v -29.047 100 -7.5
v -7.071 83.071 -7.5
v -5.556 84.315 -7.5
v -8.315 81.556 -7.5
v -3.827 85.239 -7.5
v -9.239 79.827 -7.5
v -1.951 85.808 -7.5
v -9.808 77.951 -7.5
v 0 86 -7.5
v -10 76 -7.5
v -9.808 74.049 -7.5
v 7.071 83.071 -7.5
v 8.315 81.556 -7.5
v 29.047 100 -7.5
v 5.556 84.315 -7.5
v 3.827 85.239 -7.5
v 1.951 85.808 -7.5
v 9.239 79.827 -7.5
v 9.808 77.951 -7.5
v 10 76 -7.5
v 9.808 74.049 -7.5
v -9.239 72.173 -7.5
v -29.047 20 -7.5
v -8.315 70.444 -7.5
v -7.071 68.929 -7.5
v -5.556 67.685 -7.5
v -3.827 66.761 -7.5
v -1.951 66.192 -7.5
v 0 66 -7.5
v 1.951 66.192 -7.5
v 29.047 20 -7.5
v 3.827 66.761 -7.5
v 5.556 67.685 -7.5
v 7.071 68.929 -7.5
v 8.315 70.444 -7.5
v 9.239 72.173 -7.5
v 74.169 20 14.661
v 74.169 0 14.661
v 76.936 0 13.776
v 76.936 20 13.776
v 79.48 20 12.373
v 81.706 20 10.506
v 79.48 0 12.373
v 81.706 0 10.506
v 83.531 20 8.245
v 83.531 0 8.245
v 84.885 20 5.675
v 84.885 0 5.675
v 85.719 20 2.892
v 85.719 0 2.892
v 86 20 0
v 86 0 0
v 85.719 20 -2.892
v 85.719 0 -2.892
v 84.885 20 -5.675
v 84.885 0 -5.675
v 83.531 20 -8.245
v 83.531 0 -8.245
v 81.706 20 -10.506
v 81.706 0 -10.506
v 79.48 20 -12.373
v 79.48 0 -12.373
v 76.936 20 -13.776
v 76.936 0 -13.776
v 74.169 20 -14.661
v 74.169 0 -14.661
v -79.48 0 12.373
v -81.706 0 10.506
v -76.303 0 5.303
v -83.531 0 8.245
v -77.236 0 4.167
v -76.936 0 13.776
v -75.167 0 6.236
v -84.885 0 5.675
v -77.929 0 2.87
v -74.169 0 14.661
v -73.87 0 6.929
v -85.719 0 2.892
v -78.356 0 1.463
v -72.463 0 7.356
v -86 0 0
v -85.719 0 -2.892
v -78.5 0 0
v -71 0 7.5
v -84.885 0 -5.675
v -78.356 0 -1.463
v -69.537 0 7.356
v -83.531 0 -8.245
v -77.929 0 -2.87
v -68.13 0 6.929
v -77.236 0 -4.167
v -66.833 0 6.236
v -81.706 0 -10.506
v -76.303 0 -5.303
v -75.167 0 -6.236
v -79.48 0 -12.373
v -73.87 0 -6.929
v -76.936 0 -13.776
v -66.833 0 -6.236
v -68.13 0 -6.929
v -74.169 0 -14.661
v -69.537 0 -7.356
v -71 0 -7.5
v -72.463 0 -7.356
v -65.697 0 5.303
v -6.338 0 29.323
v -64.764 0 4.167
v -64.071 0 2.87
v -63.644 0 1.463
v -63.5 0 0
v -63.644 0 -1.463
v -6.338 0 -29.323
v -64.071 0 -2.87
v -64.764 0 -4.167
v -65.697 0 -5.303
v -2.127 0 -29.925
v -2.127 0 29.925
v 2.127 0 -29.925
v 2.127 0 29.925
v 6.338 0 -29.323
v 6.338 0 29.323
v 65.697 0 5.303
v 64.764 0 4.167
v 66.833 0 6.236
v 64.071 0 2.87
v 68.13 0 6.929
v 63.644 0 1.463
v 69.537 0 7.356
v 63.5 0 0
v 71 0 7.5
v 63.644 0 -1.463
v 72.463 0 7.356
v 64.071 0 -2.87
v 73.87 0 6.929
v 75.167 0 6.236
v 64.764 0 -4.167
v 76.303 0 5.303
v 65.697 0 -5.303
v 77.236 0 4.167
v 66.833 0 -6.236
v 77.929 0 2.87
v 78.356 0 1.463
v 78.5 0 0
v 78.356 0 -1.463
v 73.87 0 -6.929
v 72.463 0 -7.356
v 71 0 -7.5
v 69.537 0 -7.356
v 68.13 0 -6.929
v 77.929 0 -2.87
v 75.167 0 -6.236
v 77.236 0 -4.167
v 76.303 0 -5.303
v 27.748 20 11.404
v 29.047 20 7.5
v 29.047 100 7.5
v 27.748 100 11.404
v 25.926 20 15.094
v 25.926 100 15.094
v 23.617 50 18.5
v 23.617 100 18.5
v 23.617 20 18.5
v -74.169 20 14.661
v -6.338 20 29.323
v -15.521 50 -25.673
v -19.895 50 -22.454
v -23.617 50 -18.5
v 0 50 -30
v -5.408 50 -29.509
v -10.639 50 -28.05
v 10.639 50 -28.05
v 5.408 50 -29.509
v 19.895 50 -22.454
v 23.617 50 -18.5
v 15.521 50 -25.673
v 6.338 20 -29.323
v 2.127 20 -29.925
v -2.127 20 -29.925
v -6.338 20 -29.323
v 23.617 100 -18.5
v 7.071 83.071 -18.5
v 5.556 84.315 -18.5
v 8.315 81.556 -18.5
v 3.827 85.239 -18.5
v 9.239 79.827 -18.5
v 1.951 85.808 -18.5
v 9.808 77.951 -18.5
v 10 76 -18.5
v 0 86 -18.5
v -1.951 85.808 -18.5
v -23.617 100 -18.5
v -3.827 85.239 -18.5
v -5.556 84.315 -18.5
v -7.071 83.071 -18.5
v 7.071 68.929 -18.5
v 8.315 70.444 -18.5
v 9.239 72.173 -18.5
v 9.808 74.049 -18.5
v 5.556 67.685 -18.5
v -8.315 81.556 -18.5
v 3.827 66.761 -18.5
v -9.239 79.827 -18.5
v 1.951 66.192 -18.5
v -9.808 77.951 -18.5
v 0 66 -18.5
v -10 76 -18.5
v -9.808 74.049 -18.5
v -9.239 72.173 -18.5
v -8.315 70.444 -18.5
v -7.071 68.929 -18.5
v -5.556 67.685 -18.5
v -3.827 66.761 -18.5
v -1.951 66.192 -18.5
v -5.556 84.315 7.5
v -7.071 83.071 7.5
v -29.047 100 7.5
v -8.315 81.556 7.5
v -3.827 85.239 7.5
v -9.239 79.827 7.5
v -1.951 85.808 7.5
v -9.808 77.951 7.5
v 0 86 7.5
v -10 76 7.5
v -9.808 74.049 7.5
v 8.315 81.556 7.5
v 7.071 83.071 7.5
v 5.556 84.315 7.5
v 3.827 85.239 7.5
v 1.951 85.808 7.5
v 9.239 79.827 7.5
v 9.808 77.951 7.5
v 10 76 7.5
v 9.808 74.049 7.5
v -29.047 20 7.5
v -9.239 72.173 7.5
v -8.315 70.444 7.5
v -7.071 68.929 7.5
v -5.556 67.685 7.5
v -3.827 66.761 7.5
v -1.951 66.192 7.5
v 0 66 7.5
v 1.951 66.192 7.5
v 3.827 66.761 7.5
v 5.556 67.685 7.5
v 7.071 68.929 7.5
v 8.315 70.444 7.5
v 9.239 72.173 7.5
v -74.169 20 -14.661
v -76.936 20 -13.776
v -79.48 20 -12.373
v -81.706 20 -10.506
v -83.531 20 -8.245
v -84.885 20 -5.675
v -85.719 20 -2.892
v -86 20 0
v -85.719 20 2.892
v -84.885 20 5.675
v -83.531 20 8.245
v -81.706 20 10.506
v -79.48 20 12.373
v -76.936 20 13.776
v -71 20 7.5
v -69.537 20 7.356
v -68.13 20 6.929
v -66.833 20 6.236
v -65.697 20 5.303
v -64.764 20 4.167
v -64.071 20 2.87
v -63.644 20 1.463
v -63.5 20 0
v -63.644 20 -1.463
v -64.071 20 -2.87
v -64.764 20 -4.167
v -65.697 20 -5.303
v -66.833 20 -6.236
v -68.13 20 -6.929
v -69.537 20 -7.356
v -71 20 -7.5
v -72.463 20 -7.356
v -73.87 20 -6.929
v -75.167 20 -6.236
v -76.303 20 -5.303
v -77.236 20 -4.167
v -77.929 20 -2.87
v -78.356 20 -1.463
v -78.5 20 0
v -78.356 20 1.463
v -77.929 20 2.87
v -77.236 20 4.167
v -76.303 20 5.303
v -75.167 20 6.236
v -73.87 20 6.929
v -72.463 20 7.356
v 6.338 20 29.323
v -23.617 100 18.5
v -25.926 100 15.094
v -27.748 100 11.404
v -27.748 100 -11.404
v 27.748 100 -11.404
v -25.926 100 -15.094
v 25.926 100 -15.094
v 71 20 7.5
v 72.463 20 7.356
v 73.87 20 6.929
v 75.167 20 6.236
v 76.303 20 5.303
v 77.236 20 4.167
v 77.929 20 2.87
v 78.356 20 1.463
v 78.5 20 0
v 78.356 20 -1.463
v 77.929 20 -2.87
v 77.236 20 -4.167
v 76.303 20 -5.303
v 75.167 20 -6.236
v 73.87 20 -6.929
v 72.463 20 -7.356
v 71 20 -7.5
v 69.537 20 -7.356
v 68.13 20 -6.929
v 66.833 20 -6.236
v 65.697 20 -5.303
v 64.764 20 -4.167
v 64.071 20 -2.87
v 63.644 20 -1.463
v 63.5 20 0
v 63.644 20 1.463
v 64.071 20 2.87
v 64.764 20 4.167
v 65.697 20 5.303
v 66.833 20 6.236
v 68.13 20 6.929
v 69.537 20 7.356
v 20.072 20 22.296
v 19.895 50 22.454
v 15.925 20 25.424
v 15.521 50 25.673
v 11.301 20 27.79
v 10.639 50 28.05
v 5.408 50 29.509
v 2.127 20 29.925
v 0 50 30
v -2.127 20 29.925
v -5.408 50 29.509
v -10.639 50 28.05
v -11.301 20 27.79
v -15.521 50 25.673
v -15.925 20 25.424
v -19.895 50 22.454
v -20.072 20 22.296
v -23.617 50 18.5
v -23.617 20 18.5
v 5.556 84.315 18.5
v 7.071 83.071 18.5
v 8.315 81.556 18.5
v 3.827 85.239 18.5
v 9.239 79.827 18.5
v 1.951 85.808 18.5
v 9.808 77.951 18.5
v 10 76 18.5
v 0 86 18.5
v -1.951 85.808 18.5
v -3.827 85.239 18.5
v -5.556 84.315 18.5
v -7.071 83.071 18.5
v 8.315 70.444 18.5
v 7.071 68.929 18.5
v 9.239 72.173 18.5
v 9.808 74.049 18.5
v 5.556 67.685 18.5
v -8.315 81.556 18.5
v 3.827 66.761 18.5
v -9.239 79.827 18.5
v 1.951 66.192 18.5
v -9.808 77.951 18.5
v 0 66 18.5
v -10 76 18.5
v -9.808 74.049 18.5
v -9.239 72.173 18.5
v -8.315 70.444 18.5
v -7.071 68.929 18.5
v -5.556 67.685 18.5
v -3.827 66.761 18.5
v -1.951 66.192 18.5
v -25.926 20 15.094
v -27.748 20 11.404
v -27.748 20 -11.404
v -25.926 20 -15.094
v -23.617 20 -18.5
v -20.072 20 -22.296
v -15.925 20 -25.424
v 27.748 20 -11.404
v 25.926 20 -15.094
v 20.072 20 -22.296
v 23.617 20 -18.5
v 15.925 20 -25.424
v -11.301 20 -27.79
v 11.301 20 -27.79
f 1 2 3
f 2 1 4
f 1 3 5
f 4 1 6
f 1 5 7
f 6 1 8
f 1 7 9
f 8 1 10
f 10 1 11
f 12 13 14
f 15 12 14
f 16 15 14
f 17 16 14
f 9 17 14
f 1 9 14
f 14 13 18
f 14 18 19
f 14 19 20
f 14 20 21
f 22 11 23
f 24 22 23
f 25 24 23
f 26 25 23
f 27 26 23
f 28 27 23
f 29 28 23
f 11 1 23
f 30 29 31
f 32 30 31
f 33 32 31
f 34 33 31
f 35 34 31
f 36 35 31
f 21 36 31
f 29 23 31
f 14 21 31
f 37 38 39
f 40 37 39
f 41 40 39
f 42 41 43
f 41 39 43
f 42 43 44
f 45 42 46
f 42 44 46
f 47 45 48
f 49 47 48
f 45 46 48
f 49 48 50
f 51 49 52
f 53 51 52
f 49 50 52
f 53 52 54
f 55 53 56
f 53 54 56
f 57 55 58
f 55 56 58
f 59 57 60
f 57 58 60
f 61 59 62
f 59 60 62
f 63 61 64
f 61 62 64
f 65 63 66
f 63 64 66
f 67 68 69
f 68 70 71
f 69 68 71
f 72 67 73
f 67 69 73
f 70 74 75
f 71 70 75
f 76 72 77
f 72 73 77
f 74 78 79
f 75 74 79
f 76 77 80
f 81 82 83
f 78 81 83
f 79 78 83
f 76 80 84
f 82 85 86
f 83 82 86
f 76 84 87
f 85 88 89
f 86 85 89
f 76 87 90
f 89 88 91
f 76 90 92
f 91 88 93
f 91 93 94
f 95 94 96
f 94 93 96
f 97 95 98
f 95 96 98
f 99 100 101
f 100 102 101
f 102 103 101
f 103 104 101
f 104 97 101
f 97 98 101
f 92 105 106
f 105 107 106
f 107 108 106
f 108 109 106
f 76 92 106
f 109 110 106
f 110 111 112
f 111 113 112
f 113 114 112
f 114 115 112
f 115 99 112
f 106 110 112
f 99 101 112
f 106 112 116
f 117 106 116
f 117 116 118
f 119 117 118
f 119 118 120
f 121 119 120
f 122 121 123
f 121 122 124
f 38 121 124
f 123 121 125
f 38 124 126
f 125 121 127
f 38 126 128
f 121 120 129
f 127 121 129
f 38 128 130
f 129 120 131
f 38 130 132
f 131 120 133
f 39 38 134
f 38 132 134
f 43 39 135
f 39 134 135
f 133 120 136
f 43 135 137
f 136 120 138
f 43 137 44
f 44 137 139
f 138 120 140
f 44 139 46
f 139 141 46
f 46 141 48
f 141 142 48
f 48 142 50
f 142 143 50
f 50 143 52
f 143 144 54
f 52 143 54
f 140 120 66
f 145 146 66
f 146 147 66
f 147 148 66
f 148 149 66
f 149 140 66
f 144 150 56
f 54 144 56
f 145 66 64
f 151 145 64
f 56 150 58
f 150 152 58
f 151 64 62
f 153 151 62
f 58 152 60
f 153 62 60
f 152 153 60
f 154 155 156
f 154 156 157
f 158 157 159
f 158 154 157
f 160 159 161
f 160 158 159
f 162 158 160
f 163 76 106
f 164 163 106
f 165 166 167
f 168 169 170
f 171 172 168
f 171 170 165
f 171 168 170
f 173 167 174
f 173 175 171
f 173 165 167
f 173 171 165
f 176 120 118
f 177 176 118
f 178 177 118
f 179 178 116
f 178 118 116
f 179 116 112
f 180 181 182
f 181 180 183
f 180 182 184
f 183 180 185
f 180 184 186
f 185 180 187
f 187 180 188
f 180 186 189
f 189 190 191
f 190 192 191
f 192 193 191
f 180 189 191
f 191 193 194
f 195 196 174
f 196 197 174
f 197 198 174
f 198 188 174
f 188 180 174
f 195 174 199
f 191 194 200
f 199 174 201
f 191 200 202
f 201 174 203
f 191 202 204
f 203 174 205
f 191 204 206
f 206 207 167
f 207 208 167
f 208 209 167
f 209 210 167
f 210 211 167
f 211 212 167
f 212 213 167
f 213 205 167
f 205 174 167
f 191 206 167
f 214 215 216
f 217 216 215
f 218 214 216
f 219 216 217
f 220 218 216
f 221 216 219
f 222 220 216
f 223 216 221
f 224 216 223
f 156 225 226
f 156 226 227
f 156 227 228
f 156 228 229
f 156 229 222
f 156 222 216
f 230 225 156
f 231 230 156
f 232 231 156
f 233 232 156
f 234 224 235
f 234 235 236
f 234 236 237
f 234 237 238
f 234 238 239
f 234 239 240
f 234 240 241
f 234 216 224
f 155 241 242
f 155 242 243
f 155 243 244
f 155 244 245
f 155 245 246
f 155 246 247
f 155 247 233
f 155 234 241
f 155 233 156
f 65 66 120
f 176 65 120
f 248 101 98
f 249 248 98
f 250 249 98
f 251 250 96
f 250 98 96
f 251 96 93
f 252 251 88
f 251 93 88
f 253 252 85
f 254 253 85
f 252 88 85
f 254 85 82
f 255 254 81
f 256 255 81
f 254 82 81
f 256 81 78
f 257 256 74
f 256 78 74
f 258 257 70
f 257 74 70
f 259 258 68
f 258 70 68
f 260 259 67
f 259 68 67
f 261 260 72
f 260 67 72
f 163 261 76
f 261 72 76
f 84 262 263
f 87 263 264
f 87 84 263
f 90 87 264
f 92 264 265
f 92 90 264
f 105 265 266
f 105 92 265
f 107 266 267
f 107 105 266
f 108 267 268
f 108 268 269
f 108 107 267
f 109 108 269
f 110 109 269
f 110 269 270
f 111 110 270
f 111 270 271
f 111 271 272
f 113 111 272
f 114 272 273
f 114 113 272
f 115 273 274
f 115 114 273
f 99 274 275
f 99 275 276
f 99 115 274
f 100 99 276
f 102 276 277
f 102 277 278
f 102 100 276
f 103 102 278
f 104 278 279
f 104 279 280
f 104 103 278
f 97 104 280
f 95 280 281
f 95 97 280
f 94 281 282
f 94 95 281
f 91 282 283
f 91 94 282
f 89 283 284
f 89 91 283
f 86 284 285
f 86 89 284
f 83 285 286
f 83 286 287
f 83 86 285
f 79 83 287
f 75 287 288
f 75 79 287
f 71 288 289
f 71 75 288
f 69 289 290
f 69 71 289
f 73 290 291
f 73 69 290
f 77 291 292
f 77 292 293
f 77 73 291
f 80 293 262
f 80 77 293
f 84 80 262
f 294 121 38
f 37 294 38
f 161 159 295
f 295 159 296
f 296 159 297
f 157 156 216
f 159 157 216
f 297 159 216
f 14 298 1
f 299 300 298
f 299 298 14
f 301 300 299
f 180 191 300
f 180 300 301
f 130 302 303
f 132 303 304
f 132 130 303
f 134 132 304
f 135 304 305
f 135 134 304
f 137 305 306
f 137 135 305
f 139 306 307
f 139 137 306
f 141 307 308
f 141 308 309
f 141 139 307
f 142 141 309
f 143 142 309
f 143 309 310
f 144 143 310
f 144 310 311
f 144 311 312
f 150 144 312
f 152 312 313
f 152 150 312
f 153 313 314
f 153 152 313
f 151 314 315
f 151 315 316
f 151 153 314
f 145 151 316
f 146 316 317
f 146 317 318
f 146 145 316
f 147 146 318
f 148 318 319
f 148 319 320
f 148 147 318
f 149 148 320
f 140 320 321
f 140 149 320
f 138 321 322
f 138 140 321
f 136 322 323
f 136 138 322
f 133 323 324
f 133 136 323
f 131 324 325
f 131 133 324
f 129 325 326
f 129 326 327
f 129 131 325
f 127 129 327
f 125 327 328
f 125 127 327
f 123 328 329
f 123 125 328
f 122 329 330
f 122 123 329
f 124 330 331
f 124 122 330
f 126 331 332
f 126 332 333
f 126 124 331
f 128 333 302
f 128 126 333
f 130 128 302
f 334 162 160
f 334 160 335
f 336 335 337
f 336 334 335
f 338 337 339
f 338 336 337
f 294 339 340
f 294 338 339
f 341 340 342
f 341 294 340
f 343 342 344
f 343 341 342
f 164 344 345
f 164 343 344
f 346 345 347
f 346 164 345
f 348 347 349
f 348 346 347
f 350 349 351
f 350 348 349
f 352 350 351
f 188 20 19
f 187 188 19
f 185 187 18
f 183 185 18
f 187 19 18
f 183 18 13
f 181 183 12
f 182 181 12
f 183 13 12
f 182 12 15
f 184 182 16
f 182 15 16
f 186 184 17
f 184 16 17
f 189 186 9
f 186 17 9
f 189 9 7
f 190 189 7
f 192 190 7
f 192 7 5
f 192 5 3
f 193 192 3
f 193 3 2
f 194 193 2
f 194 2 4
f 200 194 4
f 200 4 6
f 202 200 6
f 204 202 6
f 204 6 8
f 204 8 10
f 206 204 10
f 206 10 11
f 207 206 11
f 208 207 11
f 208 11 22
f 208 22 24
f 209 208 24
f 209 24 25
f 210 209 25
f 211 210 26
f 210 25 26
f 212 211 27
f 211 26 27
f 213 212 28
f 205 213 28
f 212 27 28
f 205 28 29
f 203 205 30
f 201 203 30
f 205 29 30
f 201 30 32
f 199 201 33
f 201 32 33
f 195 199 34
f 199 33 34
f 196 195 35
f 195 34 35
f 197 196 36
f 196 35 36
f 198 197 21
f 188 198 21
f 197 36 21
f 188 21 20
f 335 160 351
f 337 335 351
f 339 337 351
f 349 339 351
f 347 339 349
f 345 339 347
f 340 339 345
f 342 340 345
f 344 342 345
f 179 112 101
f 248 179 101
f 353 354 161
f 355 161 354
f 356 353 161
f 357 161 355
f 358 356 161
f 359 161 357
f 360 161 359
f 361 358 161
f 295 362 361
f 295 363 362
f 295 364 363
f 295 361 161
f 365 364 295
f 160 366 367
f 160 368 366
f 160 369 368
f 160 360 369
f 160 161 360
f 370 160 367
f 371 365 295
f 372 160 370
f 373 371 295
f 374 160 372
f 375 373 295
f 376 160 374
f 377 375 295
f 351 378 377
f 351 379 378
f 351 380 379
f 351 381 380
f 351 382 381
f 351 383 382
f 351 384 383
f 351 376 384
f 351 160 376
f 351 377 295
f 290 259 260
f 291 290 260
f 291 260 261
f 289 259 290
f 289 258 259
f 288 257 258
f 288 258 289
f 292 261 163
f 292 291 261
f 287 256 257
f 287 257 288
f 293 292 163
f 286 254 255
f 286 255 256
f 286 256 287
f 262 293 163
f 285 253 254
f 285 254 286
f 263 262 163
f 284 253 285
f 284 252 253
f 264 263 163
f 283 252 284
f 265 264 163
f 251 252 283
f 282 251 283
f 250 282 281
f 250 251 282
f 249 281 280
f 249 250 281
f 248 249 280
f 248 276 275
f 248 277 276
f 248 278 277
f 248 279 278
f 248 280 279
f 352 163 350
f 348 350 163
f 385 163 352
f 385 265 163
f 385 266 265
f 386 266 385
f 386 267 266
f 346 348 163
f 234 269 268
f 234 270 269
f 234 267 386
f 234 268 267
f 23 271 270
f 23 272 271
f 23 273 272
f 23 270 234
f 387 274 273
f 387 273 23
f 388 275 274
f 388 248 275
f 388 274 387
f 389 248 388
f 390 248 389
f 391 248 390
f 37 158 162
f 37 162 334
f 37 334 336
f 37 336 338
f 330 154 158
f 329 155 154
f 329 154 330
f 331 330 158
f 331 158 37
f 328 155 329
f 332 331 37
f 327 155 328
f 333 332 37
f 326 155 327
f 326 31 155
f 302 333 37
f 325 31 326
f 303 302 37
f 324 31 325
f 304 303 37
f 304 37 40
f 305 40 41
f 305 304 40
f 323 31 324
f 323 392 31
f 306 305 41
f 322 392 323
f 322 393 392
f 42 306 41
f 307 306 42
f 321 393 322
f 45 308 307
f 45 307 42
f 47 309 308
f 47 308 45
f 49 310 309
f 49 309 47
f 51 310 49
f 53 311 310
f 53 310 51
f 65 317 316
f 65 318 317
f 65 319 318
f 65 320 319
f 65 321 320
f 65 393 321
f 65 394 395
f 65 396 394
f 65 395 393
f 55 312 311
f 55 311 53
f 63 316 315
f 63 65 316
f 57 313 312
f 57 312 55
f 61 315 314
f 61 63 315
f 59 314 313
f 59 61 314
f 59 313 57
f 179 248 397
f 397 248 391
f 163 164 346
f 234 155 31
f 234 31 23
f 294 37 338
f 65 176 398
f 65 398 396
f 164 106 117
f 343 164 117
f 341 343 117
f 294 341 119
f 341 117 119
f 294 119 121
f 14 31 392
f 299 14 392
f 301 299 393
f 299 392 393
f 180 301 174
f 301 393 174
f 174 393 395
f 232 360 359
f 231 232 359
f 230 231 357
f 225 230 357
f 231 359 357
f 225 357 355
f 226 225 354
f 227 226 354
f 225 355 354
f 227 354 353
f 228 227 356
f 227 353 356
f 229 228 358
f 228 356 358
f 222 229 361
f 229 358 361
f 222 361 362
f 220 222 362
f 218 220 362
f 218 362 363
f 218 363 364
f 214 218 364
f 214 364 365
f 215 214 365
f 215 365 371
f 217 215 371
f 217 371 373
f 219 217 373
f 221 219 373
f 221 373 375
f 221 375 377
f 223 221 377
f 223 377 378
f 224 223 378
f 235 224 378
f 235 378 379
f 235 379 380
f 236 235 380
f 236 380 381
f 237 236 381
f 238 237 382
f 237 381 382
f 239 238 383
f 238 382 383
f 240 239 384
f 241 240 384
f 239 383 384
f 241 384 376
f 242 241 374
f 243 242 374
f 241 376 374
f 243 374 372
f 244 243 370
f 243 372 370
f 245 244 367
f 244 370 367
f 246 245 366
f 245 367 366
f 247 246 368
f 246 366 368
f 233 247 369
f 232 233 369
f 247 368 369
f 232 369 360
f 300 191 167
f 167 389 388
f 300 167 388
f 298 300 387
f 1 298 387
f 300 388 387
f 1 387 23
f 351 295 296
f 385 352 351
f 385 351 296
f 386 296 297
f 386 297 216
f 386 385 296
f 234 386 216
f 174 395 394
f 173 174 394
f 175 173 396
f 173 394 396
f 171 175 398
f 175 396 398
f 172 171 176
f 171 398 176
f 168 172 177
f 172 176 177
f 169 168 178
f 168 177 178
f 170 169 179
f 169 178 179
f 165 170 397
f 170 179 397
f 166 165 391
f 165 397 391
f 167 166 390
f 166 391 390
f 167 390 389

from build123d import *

# Parameters (mm, degrees)
CROQUIS1_R              = 7.5
SALIENTE_EXTRUIR2_DEPTH = 20
SALIENTE_EXTRUIR3_DEPTH = 30
SALIENTE_EXTRUIR4_DEPTH = 80
CROQUIS4_R              = 10
CORTAR_EXTRUIR1_DEPTH   = 141.528466867


with BuildPart() as part:
    # Croquis1 → Saliente-Extruir2 (new body)
    # profile 1 of 7: a face of its own
    with BuildSketch(Plane(origin=(0, 0, 0), x_dir=(1, 0, 0), z_dir=(0, 1, 0))):
        with BuildLine():
            Line((74.169014085, 14.661423864), (6.338028169, 29.322847729))
            ThreePointArc((6.338028169, 29.322847729), (15.924993338, 25.424291282), (23.616731357, 18.5))
            ThreePointArc((23.616731357, 18.5), (26.900316488, 13.280548665), (29.047375097, 7.5))
            ThreePointArc((29.047375097, 7.5), (29.760890888, 3.780128774), (30, 0))
            ThreePointArc((30, 0), (29.760890888, -3.780128774), (29.047375097, -7.5))
            ThreePointArc((29.047375097, -7.5), (26.900316488, -13.280548665), (23.616731357, -18.5))
            ThreePointArc((23.616731357, -18.5), (15.924993338, -25.424291282), (6.338028169, -29.322847729))
            Line((6.338028169, -29.322847729), (74.169014085, -14.661423864))
            ThreePointArc((74.169014085, -14.661423864), (86, 0), (74.169014085, 14.661423864))
        make_face()
        with Locations(Location((71, 0, 0), (0, 0, 270))):
            Circle(CROQUIS1_R, mode=Mode.SUBTRACT)
    # profile 2 of 7: a face of its own
    with BuildSketch(Plane(origin=(0, 0, 0), x_dir=(1, 0, 0), z_dir=(0, 1, 0))):
        with BuildLine():
            ThreePointArc((-29.047375097, -7.5), (-26.900316488, -13.280548665), (-23.616731357, -18.5))
            Line((-23.616731357, -18.5), (23.616731357, -18.5))
            ThreePointArc((23.616731357, -18.5), (26.900316488, -13.280548665), (29.047375097, -7.5))
            Line((29.047375097, -7.5), (-29.047375097, -7.5))
        make_face()
    # profile 3 of 7: a face of its own
    with BuildSketch(Plane(origin=(0, 0, 0), x_dir=(1, 0, 0), z_dir=(0, 1, 0))):
        with BuildLine():
            ThreePointArc((-23.616731357, -18.5), (-15.924993338, -25.424291282), (-6.338028169, -29.322847729))
            ThreePointArc((-6.338028169, -29.322847729), (0, -30), (6.338028169, -29.322847729))
            ThreePointArc((6.338028169, -29.322847729), (15.924993338, -25.424291282), (23.616731357, -18.5))
            Line((23.616731357, -18.5), (-23.616731357, -18.5))
        make_face()
    # profile 4 of 7: a face of its own
    with BuildSketch(Plane(origin=(0, 0, 0), x_dir=(1, 0, 0), z_dir=(0, 1, 0))):
        with BuildLine():
            Line((29.047375097, 7.5), (-29.047375097, 7.5))
            ThreePointArc((-29.047375097, 7.5), (-30, 0), (-29.047375097, -7.5))
            Line((-29.047375097, -7.5), (29.047375097, -7.5))
            ThreePointArc((29.047375097, -7.5), (29.760890888, -3.780128774), (30, 0))
            ThreePointArc((30, 0), (29.760890888, 3.780128774), (29.047375097, 7.5))
        make_face()
    # profile 5 of 7: a face of its own
    with BuildSketch(Plane(origin=(0, 0, 0), x_dir=(1, 0, 0), z_dir=(0, 1, 0))):
        with BuildLine():
            Line((23.616731357, 18.5), (-23.616731357, 18.5))
            ThreePointArc((-23.616731357, 18.5), (-26.900316488, 13.280548665), (-29.047375097, 7.5))
            Line((-29.047375097, 7.5), (29.047375097, 7.5))
            ThreePointArc((29.047375097, 7.5), (26.900316488, 13.280548665), (23.616731357, 18.5))
        make_face()
    # profile 6 of 7: a face of its own
    with BuildSketch(Plane(origin=(0, 0, 0), x_dir=(1, 0, 0), z_dir=(0, 1, 0))):
        with BuildLine():
            ThreePointArc((6.338028169, 29.322847729), (0, 30), (-6.338028169, 29.322847729))
            ThreePointArc((-6.338028169, 29.322847729), (-15.924993338, 25.424291282), (-23.616731357, 18.5))
            Line((-23.616731357, 18.5), (23.616731357, 18.5))
            ThreePointArc((23.616731357, 18.5), (15.924993338, 25.424291282), (6.338028169, 29.322847729))
        make_face()
    # profile 7 of 7: a face of its own
    with BuildSketch(Plane(origin=(0, 0, 0), x_dir=(1, 0, 0), z_dir=(0, 1, 0))):
        with BuildLine():
            Line((-6.338028169, 29.322847729), (-74.169014085, 14.661423864))
            ThreePointArc((-74.169014085, 14.661423864), (-86, 0), (-74.169014085, -14.661423864))
            Line((-74.169014085, -14.661423864), (-6.338028169, -29.322847729))
            ThreePointArc((-6.338028169, -29.322847729), (-15.924993338, -25.424291282), (-23.616731357, -18.5))
            ThreePointArc((-23.616731357, -18.5), (-26.900316488, -13.280548665), (-29.047375097, -7.5))
            ThreePointArc((-29.047375097, -7.5), (-30, 0), (-29.047375097, 7.5))
            ThreePointArc((-29.047375097, 7.5), (-26.900316488, 13.280548665), (-23.616731357, 18.5))
            ThreePointArc((-23.616731357, 18.5), (-15.924993338, 25.424291282), (-6.338028169, 29.322847729))
        make_face()
        with Locations(Location((-71, 0, 0), (0, 0, 270))):
            Circle(CROQUIS1_R, mode=Mode.SUBTRACT)
    extrude(amount=SALIENTE_EXTRUIR2_DEPTH)

    # Croquis2 → Saliente-Extruir3 (add)
    with BuildSketch(Plane(origin=(0, 20, 0), x_dir=(1, 0, 0), z_dir=(0, 1, 0))):
        with BuildLine():
            Line((-23.616731357, 18.5), (23.616731357, 18.5))
            ThreePointArc((23.616731357, 18.5), (0, 30), (-23.616731357, 18.5))
        make_face()
        with BuildLine():
            Line((-23.616731357, -18.5), (23.616731357, -18.5))
            ThreePointArc((23.616731357, -18.5), (0, -30), (-23.616731357, -18.5))
        make_face()
    extrude(amount=SALIENTE_EXTRUIR3_DEPTH)

    # Croquis3 → Saliente-Extruir4 (add)
    with BuildSketch(Plane(origin=(0, 20, 0), x_dir=(1, 0, 0), z_dir=(0, 1, 0))):
        with BuildLine():
            ThreePointArc((-23.616731357, 18.5), (-26.900316488, 13.280548665), (-29.047375097, 7.5))
            Line((-29.047375097, 7.5), (29.047375097, 7.5))
            ThreePointArc((29.047375097, 7.5), (26.900316488, 13.280548665), (23.616731357, 18.5))
            Line((23.616731357, 18.5), (-23.616731357, 18.5))
        make_face()
        with BuildLine():
            Line((-29.047375097, -7.5), (29.047375097, -7.5))
            ThreePointArc((29.047375097, -7.5), (26.900316391, -13.280548617), (23.616731357, -18.5))
            Line((23.616731357, -18.5), (-23.616731357, -18.5))
            ThreePointArc((-23.616731357, -18.5), (-26.900316488, -13.280548665), (-29.047375097, -7.5))
        make_face()
    extrude(amount=SALIENTE_EXTRUIR4_DEPTH)

    # Croquis4 → Cortar-Extruir1 (cut, through all)
    with BuildSketch(Plane.XY.offset(18.5)):
        with Locations((0, 76)):
            Circle(CROQUIS4_R)
    extrude(amount=-CORTAR_EXTRUIR1_DEPTH, mode=Mode.SUBTRACT)


solid = part.part
